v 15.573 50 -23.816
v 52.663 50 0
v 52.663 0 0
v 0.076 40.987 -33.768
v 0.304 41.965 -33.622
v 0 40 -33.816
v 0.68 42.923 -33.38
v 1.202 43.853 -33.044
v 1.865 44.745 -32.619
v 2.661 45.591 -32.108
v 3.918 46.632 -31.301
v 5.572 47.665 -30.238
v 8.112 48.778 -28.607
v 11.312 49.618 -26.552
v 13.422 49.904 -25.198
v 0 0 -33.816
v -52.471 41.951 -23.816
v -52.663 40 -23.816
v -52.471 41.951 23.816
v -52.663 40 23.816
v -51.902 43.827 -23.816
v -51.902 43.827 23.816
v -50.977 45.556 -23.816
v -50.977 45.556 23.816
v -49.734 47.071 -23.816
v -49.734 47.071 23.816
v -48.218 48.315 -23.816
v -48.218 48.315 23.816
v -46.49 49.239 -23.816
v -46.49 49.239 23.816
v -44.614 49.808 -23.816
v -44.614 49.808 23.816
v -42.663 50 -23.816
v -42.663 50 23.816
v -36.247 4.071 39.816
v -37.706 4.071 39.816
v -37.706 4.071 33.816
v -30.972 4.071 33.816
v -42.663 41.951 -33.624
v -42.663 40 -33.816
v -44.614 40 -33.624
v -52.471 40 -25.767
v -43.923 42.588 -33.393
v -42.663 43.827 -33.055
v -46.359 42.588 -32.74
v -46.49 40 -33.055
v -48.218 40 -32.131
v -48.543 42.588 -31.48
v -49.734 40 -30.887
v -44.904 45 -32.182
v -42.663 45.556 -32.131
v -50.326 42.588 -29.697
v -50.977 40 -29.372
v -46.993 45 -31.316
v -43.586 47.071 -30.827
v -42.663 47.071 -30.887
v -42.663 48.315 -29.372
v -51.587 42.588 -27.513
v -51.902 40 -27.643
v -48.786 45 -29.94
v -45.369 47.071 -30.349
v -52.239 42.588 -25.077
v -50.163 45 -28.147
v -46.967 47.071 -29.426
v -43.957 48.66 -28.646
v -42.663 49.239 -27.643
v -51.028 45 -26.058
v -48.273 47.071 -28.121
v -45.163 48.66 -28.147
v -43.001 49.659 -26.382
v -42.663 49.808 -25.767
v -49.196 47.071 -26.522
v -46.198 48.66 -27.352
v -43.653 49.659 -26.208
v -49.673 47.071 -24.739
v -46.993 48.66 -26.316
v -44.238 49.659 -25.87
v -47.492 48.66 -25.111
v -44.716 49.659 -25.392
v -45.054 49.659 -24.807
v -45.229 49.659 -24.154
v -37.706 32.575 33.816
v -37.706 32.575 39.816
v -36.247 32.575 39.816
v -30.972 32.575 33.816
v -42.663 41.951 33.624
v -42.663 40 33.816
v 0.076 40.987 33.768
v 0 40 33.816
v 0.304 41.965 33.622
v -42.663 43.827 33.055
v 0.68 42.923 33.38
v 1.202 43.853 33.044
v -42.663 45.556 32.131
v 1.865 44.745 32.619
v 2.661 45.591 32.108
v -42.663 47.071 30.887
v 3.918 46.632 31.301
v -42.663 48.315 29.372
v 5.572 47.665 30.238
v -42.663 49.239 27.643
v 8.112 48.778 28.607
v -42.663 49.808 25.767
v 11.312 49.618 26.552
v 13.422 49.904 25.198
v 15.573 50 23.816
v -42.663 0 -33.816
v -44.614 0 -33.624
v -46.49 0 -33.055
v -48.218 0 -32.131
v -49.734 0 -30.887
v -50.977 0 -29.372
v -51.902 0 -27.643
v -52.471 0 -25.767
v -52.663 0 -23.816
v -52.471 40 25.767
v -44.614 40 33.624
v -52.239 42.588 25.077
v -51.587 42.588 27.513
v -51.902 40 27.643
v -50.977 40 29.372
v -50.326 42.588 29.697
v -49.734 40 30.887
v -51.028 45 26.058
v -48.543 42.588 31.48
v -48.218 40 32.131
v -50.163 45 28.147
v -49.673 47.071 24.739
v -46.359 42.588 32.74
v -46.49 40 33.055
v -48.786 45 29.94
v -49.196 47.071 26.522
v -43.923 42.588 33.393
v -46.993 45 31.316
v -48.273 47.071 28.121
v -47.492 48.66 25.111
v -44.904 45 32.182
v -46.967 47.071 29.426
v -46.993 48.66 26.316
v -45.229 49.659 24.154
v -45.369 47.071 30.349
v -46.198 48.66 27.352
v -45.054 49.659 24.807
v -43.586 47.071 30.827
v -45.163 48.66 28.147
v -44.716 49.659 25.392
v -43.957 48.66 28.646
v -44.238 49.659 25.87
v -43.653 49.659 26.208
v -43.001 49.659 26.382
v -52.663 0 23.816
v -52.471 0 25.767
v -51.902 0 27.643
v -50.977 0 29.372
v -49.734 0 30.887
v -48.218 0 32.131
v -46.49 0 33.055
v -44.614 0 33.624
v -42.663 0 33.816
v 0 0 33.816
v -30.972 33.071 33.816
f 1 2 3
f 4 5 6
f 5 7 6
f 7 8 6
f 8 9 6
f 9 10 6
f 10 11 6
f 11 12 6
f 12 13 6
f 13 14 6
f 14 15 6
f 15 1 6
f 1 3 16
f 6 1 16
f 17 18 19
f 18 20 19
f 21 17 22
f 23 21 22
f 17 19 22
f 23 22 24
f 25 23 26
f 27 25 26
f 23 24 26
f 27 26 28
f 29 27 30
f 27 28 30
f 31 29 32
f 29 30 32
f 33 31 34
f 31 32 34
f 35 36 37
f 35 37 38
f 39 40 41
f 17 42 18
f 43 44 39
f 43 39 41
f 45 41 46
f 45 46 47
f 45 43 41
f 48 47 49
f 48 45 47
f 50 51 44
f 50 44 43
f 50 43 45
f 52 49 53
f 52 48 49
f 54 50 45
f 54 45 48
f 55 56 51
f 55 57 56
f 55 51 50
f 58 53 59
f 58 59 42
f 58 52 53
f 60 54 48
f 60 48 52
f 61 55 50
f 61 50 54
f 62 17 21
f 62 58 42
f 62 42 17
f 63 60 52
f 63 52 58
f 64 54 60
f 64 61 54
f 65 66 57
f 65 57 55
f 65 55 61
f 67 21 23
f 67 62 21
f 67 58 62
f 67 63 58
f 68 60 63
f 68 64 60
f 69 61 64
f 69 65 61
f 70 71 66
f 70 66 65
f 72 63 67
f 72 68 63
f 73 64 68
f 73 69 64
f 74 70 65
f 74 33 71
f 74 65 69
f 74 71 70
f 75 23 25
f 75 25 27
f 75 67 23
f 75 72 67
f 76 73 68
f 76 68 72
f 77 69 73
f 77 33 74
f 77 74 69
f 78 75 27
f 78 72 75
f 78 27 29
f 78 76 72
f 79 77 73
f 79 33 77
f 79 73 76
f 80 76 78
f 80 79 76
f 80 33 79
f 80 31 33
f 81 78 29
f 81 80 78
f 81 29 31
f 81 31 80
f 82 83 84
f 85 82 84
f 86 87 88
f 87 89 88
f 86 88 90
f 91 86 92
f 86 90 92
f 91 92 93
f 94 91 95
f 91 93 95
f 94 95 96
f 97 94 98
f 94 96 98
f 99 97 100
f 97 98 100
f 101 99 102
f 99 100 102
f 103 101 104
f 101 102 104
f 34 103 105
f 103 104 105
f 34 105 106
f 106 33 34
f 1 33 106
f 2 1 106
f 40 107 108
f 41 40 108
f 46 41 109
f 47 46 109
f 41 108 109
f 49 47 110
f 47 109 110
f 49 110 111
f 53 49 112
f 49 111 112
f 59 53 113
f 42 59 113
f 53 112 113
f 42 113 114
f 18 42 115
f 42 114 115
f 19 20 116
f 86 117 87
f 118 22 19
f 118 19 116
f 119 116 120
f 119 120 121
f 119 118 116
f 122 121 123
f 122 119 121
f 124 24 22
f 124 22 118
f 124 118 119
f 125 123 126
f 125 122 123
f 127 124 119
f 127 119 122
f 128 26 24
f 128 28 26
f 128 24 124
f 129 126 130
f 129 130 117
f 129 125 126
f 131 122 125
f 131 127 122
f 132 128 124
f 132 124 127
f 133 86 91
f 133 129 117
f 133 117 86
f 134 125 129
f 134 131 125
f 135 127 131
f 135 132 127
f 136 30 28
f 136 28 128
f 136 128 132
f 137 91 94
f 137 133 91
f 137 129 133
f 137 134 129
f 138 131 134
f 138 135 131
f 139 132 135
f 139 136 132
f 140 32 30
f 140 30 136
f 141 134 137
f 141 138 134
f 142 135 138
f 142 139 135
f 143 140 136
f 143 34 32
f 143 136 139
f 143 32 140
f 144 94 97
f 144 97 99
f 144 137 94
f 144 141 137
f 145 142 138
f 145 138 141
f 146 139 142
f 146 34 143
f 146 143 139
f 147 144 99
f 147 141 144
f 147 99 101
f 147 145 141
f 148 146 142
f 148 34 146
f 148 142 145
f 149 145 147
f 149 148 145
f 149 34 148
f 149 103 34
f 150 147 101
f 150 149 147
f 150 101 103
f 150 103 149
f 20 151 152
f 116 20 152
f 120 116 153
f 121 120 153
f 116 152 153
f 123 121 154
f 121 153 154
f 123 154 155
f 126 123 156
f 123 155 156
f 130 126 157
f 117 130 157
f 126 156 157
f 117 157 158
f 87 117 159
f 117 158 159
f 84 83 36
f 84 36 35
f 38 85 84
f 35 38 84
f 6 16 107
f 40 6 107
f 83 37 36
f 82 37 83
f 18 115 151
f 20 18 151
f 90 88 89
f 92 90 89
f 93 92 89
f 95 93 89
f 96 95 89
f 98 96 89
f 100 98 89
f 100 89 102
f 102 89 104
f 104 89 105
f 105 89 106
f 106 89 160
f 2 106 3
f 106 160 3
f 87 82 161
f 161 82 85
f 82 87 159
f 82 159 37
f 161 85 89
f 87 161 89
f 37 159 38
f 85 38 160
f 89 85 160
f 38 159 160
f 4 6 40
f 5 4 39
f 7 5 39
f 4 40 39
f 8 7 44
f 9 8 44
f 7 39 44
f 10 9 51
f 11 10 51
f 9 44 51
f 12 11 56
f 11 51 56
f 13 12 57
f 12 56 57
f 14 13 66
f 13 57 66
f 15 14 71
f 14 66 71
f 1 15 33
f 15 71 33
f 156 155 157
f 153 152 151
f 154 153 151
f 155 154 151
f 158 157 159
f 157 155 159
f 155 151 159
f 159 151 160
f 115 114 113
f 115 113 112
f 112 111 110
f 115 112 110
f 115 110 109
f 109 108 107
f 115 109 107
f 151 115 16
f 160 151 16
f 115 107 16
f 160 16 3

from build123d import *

# Parameters (mm, degrees)
BOSS_EXTRUDE1_DEPTH = 50
FILLET1_R           = 10
SKETCH2_W           = 6.733148768
SKETCH2_H           = 28.503663117
BOSS_EXTRUDE2_DEPTH = 6
CUT_EXTRUDE1_DEPTH  = 29


with BuildPart() as part:
    # Sketch1 → Boss-Extrude1 (new body)
    with BuildSketch(Plane(origin=(0, 0, 0), x_dir=(1, 0, 0), z_dir=(0, 1, 0))):
        with BuildLine():
            Line((0, -33.816412485), (52.662713514, 0))
            Line((52.662713514, 0), (0, 33.816412485))
            Line((0, 33.816412485), (-42.662713514, 33.816412485))
            ThreePointArc((-42.662713514, 33.816412485), (-49.733781326, 30.887480297), (-52.662713514, 23.816412485))
            Line((-52.662713514, 23.816412485), (-52.662713514, -23.816412485))
            ThreePointArc((-52.662713514, -23.816412485), (-49.733781326, -30.887480297), (-42.662713514, -33.816412485))
            Line((-42.662713514, -33.816412485), (0, -33.816412485))
        make_face()
    extrude(amount=BOSS_EXTRUDE1_DEPTH)

    # Fillet1
    fillet1_edges = [part.edges().sort_by_distance(p)[0] for p in [
        (-49.733781326, 50, -30.887480297),
        (-52.662713514, 50, 0),
        (-49.733781326, 50, 30.887480297),
        (-21.331356757, 50, 33.816412485),
        (-21.331356757, 50, -33.816412485),
    ]]
    fillet(fillet1_edges, radius=FILLET1_R)

    # Sketch2 → Boss-Extrude2 (add)
    with BuildSketch(Plane.XY.offset(33.816412485)):
        with Locations((-34.339058715, 18.322960806)):
            Rectangle(SKETCH2_W, SKETCH2_H)
    extrude(amount=BOSS_EXTRUDE2_DEPTH)

    # Sketch3 → Cut-Extrude1 (cut)
    with BuildSketch(Plane(origin=(0, 4.071129247, 0), x_dir=(-1, 0, 0), z_dir=(0, -1, 0))):
        Polygon((30.972484331, -33.816412485), (36.246784199, -39.816412485), (30.972484331, -39.816412485), align=None)
    extrude(amount=-CUT_EXTRUDE1_DEPTH, mode=Mode.SUBTRACT)


solid = part.part
